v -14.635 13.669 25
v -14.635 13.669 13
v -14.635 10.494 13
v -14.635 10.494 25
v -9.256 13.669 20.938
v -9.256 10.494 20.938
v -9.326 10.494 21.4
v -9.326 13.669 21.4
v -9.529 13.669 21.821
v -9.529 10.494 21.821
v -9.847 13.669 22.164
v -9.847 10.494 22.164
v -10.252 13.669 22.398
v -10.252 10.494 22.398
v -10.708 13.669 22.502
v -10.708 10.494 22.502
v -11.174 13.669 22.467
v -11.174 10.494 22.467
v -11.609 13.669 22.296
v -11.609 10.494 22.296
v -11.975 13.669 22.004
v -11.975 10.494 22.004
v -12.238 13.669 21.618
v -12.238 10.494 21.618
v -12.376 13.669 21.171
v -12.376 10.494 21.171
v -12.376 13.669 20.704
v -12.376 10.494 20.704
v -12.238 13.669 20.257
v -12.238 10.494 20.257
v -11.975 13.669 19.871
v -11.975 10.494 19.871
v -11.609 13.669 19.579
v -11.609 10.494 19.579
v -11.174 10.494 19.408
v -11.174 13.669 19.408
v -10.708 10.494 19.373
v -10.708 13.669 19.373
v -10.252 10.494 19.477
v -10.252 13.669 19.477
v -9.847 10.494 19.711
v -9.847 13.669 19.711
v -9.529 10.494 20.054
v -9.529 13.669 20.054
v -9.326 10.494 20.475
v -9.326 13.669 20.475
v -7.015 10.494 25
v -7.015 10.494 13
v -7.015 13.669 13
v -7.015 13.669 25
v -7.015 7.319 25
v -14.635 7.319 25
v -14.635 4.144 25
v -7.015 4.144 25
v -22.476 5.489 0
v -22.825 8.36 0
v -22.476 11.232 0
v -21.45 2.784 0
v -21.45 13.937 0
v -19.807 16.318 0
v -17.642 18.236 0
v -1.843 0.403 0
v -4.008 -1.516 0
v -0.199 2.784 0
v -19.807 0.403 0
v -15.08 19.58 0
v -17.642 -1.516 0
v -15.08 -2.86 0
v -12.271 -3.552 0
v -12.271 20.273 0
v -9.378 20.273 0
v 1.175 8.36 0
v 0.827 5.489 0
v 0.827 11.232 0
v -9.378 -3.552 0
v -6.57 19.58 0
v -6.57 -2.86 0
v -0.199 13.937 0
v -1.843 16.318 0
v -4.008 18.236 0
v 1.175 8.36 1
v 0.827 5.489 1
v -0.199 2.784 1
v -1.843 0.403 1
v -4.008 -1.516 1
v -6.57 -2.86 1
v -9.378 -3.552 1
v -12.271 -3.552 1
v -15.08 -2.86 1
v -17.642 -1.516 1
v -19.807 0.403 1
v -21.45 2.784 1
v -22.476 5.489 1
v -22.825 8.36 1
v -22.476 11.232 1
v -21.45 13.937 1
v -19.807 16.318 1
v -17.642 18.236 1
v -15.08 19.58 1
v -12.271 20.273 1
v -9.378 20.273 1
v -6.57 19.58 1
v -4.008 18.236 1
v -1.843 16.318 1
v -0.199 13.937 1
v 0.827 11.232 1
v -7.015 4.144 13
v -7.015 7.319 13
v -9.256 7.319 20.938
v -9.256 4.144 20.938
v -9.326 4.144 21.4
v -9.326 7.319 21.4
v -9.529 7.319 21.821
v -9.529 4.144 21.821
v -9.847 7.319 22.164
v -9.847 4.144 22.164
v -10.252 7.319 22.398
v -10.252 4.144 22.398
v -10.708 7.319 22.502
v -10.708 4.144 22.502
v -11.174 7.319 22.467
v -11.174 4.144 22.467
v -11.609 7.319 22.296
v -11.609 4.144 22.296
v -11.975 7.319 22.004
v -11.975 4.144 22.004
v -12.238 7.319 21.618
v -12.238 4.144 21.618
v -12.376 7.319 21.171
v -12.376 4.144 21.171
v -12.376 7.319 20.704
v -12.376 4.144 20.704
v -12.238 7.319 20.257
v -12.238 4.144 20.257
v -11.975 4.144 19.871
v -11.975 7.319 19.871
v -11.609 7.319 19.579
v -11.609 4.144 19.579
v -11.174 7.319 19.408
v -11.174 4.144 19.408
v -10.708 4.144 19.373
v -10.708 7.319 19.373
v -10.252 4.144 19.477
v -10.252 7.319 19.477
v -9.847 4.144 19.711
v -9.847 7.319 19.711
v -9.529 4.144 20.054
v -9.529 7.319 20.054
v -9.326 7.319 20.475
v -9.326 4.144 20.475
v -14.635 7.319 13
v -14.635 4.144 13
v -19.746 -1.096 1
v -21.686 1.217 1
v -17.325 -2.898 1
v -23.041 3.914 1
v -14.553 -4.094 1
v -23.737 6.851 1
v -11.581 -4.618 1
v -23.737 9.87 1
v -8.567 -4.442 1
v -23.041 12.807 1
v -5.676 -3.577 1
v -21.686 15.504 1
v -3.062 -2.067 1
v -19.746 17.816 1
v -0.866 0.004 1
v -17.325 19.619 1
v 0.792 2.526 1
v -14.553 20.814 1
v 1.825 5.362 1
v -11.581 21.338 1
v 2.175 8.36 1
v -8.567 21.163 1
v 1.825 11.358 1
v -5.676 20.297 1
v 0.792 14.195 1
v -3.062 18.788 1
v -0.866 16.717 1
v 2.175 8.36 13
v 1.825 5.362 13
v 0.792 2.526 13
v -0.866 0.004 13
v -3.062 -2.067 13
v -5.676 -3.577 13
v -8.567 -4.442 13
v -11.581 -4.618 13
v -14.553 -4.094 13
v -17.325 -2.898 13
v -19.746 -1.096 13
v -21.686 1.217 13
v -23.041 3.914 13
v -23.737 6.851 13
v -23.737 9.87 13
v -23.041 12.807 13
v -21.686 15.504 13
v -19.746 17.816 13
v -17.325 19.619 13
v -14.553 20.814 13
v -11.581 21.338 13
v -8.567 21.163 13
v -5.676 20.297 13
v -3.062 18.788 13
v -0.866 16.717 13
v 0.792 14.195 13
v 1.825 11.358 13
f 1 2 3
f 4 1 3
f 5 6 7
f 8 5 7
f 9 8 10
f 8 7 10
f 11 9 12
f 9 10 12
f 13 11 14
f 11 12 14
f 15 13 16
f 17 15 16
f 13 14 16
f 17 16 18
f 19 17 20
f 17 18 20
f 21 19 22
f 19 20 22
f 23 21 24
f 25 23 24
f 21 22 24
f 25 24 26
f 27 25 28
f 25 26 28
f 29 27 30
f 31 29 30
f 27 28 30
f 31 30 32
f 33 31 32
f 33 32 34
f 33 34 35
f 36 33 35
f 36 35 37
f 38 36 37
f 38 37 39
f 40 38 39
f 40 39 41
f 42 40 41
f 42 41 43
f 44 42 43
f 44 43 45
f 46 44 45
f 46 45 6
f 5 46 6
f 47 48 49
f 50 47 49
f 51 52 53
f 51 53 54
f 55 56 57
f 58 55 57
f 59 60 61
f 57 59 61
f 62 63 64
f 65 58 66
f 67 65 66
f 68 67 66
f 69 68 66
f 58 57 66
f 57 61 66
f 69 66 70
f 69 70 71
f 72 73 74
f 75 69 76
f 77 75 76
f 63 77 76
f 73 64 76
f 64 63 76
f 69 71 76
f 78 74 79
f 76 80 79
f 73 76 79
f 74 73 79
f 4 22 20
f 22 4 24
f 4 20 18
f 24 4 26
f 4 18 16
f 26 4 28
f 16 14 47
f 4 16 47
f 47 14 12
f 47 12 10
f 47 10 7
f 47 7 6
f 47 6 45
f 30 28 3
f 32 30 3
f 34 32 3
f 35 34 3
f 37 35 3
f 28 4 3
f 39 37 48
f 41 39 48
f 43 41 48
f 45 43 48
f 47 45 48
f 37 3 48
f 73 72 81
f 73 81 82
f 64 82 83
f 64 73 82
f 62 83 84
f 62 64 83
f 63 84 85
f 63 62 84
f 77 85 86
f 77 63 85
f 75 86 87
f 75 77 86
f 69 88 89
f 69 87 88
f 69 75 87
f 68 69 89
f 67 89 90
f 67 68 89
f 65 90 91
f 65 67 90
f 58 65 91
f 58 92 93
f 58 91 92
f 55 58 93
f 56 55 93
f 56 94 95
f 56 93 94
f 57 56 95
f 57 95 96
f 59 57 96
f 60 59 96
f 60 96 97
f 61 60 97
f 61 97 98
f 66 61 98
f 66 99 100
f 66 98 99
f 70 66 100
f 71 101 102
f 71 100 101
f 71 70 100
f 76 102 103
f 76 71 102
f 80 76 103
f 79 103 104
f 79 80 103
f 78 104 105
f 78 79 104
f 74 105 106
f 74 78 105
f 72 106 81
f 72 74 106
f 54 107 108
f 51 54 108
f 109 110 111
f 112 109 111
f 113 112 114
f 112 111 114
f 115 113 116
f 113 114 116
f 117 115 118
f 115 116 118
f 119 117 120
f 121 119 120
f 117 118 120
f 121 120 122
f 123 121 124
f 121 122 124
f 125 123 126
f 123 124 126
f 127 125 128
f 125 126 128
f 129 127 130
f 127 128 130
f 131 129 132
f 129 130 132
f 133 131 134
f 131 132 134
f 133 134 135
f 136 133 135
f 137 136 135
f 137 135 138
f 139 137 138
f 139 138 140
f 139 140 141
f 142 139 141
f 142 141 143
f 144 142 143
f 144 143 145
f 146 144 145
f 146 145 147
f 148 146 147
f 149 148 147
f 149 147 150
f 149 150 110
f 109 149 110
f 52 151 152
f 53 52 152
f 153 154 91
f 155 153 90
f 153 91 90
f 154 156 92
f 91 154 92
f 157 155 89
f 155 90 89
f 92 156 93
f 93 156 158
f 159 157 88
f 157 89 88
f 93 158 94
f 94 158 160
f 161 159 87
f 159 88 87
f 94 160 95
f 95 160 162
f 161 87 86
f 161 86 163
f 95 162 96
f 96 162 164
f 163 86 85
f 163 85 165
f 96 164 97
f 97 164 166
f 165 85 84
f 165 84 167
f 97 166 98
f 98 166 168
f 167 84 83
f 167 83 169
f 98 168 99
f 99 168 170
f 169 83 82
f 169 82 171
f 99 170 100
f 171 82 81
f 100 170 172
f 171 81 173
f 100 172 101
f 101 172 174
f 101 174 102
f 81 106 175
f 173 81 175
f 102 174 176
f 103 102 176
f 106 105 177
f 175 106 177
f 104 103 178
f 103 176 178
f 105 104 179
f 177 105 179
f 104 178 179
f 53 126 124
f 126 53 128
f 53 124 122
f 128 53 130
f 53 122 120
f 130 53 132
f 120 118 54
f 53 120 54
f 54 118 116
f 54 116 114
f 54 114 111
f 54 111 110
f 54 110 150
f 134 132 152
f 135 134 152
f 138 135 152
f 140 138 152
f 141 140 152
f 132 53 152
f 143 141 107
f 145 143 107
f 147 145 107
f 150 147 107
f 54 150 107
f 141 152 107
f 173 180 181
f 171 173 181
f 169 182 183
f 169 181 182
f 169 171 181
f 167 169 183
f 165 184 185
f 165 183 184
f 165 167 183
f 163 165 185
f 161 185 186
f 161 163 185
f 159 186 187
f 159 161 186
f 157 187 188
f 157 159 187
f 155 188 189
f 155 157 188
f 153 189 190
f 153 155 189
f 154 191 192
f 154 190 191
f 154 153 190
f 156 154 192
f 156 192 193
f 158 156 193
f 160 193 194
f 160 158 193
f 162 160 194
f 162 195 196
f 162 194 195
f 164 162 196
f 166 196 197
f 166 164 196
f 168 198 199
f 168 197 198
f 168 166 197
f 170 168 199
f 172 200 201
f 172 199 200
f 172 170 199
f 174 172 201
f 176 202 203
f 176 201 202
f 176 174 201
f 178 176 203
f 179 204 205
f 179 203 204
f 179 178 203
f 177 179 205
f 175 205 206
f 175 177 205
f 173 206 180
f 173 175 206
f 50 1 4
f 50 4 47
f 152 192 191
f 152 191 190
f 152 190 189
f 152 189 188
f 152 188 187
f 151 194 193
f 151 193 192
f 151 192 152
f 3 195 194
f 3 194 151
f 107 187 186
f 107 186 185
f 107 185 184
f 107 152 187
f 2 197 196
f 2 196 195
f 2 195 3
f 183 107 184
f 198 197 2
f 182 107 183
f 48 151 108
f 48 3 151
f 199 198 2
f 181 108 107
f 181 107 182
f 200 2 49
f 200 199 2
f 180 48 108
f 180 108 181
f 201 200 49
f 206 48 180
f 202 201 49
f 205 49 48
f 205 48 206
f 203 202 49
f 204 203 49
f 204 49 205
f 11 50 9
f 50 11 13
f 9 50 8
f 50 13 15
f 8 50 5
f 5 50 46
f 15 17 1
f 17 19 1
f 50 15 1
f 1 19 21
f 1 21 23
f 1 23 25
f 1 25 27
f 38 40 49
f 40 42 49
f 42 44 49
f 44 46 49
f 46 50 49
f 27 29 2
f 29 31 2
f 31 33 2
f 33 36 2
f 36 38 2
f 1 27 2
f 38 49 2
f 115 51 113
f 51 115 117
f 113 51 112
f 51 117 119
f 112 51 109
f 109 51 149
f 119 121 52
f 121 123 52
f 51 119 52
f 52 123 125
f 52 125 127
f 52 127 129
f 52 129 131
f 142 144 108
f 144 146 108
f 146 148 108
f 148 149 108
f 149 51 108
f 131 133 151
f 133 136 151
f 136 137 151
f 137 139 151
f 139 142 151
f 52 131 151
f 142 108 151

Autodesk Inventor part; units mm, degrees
ref_plane "YZ Plane" through (0, 0, 0) normal (1, 0, 0) x (0, 1, 0)
ref_plane "XZ Plane" through (0, 0, 0) normal (0, 1, 0) x (-1, 0, 0)
ref_plane "XY Plane" through (0, 0, 0) normal (0, 0, 1) x (1, 0, 0)
ref_plane "Work Plane1" through (-10.8248, 8.3603, 0) normal (0, 0, 1) x (1, 0, 0)
sketch "Sketch3" plane through (-10.8248, 8.3603, 0) normal (0, 0, 1) x (1, 0, 0)
  circle A0 centre (0, 0) radius 12
  point P0 (0, 0)
  dimension "d0" = 24
extrude "Extrusion1" add sketch "Sketch3" along normal blind 1
sketch "Sketch4" plane through (-10.8248, 8.3603, 1) normal (0, 0, 1) x (1, 0, 0)
  circle A0 centre (0, 0) radius 13
  circle A1 centre (0, 0) radius 12 projected
  dimension "d4" = 26
extrude "Extrusion2" add sketch "Sketch4" along normal blind 12 contours A0 | A1
sketch "Sketch5" plane through (-10.8248, 8.3603, 13) normal (0, 0, 1) x (1, 0, 0)
  line L0 (-3.81, 2.1338) -> (3.81, 2.1338)
  line L1 (3.81, 2.1338) -> (3.81, 5.3088)
  line L2 (3.81, 5.3088) -> (-3.81, 5.3088)
  line L3 (-3.81, 5.3088) -> (-3.81, 2.1338)
  line L4 (-3.81, -4.2162) -> (3.81, -4.2162)
  line L5 (3.81, -4.2162) -> (3.81, -1.0412)
  line L6 (3.81, -1.0412) -> (-3.81, -1.0412)
  line L7 (-3.81, -1.0412) -> (-3.81, -4.2162)
  circle A0 centre (0, 0) radius 13 projected
  point P0 (0, -7.7939)
  dimension "d15" = 7.62
  dimension "d16" = 3.175
  dimension "d17" = 7.62
  dimension "d18" = 3.175
  dimension "d19" = 3.175
  dimension "d20" = 3.81
  dimension "d21" = 3.81
extrude "Extrusion3" add sketch "Sketch5" along normal blind 12 contours L3 L2 L1 L0 | L7 L6 L5 L4
sketch "Sketch6" plane through (-15.5873, 4.1441, 13) normal (0, -1, 0) x (1, 0, 0)
  circle A0 centre (4.7625, 7.9375) radius 1.5685
  line L0 (0.9525, 0) -> (0.9525, 12) projected
  point P0 (4.7625, -37.7)
  dimension "d22" = 3.81
extrude "Extrusion4" cut sketch "Sketch6" against normal blind 12
properties part number "Swing_Joint_2"
